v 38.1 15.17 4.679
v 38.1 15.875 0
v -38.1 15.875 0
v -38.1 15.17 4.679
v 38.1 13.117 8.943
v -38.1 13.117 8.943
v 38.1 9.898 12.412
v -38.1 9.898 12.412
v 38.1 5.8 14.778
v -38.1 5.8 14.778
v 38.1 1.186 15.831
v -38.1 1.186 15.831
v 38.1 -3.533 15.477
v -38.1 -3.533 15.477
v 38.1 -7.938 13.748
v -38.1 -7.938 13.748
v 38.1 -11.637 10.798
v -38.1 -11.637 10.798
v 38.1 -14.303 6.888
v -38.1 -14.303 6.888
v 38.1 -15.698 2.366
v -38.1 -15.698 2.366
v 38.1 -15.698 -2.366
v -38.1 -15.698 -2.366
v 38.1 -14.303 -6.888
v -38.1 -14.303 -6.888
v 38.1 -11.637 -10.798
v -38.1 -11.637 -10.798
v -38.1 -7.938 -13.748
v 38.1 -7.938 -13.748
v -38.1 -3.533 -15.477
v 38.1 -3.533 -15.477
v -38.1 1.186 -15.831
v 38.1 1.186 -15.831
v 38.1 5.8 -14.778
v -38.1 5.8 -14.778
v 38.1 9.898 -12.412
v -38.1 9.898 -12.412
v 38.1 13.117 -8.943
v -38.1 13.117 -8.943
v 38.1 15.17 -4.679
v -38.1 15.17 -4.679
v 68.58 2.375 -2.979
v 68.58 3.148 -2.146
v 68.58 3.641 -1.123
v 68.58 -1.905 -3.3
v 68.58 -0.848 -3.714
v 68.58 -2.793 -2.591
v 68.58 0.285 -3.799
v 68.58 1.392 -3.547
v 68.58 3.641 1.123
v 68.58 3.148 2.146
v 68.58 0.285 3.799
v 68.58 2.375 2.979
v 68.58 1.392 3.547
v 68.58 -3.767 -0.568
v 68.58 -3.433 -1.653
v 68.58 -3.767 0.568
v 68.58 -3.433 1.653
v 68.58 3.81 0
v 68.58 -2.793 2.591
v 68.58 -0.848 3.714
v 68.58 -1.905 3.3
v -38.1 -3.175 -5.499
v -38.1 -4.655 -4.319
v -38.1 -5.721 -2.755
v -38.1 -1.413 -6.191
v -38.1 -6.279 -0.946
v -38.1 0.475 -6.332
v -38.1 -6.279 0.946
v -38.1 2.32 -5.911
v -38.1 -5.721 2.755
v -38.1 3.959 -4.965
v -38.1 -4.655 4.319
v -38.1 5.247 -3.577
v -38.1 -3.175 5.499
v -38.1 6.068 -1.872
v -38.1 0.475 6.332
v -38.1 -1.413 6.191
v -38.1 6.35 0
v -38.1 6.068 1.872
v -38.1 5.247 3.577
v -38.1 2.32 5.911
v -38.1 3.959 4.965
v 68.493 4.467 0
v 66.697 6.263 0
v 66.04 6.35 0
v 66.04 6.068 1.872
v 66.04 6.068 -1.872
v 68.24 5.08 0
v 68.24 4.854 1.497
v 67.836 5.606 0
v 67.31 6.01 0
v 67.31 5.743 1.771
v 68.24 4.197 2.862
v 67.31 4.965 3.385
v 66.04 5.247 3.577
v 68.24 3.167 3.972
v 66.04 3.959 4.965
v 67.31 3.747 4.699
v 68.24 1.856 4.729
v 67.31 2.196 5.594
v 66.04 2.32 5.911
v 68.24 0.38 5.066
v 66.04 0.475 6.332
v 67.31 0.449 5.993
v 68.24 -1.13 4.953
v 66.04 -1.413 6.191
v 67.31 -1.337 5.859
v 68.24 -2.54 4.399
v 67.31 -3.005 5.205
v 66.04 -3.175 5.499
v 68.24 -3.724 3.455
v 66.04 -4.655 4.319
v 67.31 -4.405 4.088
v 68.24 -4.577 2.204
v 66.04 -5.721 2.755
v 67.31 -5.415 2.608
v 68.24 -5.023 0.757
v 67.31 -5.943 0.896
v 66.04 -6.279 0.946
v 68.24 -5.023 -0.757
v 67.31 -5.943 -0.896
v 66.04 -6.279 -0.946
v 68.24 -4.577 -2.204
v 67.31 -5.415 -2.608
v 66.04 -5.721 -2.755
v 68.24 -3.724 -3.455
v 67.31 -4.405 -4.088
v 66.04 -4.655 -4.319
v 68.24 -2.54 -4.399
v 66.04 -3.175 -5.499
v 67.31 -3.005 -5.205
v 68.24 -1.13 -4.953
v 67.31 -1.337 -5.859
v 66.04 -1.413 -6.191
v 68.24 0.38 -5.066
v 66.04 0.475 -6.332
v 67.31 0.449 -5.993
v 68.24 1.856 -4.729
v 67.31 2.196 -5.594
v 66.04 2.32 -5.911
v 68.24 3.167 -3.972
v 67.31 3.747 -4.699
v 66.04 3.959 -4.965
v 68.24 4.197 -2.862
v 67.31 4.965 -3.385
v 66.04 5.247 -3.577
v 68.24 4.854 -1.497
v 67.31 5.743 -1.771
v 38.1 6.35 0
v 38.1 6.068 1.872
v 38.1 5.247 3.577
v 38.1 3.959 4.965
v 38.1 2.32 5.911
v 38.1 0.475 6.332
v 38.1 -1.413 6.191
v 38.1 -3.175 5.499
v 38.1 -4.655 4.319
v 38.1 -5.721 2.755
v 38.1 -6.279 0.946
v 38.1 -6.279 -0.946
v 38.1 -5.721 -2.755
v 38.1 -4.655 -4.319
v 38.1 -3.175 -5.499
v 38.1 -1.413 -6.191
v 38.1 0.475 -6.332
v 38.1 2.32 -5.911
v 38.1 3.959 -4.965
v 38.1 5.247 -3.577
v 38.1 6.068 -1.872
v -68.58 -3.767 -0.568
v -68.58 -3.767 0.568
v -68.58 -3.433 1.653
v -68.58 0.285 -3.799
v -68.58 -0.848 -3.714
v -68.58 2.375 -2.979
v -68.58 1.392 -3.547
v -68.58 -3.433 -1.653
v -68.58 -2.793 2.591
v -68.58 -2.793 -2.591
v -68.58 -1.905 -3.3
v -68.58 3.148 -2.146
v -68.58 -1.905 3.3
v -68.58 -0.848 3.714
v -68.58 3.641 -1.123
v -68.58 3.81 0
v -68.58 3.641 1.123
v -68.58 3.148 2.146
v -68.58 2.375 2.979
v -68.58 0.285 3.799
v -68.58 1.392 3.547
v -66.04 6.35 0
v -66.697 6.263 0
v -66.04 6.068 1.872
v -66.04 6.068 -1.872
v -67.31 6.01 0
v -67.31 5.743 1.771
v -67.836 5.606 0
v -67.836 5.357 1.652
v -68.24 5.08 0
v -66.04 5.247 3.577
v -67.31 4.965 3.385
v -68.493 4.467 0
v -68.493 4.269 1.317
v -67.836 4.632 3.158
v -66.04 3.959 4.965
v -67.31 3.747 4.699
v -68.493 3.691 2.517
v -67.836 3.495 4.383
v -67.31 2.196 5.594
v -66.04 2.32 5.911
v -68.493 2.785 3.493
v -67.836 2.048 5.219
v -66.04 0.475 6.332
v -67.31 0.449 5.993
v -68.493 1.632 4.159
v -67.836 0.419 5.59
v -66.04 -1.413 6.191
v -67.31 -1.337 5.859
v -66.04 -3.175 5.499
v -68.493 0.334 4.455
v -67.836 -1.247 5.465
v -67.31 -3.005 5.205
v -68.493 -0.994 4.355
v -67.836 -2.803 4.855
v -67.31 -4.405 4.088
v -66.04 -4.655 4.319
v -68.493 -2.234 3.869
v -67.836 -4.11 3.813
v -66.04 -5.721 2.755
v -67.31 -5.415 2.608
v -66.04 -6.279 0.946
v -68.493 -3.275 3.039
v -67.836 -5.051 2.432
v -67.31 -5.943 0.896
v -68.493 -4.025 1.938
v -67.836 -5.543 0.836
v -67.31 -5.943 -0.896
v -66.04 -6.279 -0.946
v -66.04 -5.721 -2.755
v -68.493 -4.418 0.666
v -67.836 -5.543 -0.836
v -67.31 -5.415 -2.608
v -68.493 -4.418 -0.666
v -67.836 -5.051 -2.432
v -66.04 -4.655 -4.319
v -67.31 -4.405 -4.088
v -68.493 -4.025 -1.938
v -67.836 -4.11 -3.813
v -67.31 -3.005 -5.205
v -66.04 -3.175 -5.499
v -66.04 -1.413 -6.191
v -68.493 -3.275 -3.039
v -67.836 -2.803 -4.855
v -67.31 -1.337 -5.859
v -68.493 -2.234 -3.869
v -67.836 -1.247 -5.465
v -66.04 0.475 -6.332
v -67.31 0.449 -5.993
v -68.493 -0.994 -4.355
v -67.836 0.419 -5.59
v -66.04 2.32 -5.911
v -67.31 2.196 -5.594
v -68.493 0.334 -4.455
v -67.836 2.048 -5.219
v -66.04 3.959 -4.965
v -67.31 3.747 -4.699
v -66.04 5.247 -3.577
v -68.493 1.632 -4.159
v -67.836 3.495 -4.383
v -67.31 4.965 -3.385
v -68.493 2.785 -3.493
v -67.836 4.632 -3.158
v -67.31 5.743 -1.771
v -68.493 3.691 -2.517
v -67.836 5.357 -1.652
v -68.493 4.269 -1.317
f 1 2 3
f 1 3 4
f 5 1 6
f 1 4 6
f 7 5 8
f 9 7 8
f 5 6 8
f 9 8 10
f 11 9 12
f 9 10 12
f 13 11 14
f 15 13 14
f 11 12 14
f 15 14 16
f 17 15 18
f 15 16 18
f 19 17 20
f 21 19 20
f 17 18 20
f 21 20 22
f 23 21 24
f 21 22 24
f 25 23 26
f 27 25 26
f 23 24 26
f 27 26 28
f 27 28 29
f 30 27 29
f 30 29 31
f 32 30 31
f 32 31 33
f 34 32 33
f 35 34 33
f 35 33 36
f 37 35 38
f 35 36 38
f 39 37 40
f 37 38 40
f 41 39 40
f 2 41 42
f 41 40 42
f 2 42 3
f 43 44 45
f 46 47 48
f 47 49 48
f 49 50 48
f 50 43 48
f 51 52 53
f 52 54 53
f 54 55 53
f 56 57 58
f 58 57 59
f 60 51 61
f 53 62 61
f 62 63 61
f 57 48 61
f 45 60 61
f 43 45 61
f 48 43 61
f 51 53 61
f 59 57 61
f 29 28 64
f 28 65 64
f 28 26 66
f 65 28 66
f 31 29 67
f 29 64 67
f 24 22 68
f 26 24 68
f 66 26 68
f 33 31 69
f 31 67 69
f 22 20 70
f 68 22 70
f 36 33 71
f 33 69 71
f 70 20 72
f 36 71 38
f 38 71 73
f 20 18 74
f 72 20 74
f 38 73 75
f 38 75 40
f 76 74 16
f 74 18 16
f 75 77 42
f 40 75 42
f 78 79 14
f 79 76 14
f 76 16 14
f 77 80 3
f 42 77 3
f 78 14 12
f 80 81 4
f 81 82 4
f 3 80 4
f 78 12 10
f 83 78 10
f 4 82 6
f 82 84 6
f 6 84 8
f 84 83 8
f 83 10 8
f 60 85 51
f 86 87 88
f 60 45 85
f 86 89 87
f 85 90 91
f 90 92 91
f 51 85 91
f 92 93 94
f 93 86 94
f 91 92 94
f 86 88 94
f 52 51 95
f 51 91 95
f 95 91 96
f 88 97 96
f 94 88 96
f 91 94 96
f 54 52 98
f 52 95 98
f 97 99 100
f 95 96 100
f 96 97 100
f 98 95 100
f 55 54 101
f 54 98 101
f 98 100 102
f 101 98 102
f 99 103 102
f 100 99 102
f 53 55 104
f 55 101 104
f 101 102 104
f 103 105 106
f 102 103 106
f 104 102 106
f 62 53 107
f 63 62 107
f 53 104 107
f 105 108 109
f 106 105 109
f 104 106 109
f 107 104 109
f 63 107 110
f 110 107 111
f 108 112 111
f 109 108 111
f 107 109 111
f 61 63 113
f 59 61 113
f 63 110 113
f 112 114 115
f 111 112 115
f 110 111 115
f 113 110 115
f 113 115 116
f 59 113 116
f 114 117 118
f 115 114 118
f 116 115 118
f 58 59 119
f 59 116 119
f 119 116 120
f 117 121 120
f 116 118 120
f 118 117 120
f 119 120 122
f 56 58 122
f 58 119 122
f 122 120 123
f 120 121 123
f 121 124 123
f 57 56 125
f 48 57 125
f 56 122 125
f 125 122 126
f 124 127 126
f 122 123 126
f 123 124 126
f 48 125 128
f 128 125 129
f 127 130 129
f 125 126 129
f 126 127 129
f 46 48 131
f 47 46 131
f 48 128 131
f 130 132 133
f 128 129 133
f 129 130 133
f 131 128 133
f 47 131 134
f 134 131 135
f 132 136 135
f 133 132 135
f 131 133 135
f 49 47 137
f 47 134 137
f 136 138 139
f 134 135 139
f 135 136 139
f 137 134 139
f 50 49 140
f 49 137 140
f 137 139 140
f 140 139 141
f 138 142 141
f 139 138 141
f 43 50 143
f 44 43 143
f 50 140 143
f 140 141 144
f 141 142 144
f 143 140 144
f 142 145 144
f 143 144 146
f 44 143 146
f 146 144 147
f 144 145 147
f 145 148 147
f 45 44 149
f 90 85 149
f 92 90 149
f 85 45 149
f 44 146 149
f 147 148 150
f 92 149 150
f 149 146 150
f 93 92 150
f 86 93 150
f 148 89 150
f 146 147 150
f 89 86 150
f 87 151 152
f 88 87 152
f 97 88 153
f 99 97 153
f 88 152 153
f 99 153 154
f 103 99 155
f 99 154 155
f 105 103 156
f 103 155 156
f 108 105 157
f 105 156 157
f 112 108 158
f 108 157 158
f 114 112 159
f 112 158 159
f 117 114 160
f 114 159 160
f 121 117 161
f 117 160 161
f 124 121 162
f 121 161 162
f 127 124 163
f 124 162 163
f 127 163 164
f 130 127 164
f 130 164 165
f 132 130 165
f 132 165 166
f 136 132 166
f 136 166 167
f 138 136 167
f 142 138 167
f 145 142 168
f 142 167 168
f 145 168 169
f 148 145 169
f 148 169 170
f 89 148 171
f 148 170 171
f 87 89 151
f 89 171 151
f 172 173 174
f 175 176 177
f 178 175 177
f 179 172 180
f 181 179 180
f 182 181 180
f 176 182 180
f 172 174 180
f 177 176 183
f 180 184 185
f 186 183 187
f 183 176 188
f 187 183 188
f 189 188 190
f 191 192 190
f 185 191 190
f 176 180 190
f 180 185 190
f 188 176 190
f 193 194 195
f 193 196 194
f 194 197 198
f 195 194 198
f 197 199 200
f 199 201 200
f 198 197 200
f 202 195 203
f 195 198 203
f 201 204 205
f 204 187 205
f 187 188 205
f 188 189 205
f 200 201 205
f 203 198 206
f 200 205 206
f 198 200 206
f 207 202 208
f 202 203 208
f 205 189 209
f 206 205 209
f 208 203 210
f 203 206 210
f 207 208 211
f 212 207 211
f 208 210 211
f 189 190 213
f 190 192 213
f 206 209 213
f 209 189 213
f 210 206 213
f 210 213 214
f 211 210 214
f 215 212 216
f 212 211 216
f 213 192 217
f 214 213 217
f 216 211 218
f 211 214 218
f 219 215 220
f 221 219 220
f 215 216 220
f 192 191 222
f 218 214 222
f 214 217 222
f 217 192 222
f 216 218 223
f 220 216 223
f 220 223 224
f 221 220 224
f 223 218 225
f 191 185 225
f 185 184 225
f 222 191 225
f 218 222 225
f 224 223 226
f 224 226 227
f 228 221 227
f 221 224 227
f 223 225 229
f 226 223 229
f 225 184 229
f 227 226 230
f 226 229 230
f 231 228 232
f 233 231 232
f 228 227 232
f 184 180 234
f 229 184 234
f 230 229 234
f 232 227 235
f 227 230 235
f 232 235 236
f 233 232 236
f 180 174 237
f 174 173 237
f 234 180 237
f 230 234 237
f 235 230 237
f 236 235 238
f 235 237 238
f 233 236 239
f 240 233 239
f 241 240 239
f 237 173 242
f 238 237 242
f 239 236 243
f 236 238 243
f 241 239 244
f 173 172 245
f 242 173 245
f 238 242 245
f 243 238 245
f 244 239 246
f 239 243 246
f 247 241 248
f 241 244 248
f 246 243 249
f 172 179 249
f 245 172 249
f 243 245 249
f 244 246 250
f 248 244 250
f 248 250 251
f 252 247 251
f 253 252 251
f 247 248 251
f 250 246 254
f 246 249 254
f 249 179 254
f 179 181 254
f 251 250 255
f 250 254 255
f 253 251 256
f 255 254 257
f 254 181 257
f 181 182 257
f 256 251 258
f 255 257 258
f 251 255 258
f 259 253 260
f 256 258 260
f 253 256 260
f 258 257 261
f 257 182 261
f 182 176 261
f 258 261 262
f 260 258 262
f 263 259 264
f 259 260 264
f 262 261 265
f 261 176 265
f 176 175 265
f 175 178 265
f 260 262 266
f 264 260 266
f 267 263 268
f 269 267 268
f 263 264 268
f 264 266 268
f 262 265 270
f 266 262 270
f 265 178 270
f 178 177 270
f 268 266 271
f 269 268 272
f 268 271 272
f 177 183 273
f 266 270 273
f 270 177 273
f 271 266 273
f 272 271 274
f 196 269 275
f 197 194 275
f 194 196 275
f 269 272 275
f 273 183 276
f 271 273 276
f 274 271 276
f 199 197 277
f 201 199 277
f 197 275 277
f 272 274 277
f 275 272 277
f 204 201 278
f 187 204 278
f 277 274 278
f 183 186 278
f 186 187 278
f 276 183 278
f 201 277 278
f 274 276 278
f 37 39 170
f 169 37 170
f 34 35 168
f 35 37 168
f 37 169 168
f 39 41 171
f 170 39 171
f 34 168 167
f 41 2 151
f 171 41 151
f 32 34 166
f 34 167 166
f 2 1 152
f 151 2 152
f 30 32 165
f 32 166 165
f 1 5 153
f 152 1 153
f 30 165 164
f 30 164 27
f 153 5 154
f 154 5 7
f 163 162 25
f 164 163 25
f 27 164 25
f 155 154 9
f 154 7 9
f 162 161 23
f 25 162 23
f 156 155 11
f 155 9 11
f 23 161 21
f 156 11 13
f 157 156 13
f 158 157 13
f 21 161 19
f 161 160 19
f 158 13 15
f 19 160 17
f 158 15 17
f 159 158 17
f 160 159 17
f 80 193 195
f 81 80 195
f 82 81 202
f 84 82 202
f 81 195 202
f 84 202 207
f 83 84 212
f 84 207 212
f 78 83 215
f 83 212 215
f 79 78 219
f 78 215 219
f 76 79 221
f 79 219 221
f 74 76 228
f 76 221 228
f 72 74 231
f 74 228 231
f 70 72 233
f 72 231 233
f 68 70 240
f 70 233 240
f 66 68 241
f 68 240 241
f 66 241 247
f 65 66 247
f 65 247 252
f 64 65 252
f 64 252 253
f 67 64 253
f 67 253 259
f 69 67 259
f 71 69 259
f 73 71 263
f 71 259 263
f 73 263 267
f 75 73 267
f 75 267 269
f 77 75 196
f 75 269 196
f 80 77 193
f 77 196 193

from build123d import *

# Parameters (mm, degrees)
FILLET1_R = 2.54


with BuildPart() as part:
    # Sketch1 → Revolve2 (revolve)
    with BuildSketch(Plane.XY):
        Polygon((-68.58, 0), (68.58, 0), (68.58, 6.35), (38.1, 6.35), (38.1, 15.875), (-38.1, 15.875), (-38.1, 6.35), (-68.58, 6.35), align=None)
    revolve(axis=Axis((-68.58, 0, 0), (1, 0, 0)))

    # Fillet1
    fillet1_edges = [part.edges().sort_by_distance(p)[0] for p in [
        (-68.58, -6.35, 0),
        (68.58, -6.35, 0),
    ]]
    fillet(fillet1_edges, radius=FILLET1_R)


solid = part.part
